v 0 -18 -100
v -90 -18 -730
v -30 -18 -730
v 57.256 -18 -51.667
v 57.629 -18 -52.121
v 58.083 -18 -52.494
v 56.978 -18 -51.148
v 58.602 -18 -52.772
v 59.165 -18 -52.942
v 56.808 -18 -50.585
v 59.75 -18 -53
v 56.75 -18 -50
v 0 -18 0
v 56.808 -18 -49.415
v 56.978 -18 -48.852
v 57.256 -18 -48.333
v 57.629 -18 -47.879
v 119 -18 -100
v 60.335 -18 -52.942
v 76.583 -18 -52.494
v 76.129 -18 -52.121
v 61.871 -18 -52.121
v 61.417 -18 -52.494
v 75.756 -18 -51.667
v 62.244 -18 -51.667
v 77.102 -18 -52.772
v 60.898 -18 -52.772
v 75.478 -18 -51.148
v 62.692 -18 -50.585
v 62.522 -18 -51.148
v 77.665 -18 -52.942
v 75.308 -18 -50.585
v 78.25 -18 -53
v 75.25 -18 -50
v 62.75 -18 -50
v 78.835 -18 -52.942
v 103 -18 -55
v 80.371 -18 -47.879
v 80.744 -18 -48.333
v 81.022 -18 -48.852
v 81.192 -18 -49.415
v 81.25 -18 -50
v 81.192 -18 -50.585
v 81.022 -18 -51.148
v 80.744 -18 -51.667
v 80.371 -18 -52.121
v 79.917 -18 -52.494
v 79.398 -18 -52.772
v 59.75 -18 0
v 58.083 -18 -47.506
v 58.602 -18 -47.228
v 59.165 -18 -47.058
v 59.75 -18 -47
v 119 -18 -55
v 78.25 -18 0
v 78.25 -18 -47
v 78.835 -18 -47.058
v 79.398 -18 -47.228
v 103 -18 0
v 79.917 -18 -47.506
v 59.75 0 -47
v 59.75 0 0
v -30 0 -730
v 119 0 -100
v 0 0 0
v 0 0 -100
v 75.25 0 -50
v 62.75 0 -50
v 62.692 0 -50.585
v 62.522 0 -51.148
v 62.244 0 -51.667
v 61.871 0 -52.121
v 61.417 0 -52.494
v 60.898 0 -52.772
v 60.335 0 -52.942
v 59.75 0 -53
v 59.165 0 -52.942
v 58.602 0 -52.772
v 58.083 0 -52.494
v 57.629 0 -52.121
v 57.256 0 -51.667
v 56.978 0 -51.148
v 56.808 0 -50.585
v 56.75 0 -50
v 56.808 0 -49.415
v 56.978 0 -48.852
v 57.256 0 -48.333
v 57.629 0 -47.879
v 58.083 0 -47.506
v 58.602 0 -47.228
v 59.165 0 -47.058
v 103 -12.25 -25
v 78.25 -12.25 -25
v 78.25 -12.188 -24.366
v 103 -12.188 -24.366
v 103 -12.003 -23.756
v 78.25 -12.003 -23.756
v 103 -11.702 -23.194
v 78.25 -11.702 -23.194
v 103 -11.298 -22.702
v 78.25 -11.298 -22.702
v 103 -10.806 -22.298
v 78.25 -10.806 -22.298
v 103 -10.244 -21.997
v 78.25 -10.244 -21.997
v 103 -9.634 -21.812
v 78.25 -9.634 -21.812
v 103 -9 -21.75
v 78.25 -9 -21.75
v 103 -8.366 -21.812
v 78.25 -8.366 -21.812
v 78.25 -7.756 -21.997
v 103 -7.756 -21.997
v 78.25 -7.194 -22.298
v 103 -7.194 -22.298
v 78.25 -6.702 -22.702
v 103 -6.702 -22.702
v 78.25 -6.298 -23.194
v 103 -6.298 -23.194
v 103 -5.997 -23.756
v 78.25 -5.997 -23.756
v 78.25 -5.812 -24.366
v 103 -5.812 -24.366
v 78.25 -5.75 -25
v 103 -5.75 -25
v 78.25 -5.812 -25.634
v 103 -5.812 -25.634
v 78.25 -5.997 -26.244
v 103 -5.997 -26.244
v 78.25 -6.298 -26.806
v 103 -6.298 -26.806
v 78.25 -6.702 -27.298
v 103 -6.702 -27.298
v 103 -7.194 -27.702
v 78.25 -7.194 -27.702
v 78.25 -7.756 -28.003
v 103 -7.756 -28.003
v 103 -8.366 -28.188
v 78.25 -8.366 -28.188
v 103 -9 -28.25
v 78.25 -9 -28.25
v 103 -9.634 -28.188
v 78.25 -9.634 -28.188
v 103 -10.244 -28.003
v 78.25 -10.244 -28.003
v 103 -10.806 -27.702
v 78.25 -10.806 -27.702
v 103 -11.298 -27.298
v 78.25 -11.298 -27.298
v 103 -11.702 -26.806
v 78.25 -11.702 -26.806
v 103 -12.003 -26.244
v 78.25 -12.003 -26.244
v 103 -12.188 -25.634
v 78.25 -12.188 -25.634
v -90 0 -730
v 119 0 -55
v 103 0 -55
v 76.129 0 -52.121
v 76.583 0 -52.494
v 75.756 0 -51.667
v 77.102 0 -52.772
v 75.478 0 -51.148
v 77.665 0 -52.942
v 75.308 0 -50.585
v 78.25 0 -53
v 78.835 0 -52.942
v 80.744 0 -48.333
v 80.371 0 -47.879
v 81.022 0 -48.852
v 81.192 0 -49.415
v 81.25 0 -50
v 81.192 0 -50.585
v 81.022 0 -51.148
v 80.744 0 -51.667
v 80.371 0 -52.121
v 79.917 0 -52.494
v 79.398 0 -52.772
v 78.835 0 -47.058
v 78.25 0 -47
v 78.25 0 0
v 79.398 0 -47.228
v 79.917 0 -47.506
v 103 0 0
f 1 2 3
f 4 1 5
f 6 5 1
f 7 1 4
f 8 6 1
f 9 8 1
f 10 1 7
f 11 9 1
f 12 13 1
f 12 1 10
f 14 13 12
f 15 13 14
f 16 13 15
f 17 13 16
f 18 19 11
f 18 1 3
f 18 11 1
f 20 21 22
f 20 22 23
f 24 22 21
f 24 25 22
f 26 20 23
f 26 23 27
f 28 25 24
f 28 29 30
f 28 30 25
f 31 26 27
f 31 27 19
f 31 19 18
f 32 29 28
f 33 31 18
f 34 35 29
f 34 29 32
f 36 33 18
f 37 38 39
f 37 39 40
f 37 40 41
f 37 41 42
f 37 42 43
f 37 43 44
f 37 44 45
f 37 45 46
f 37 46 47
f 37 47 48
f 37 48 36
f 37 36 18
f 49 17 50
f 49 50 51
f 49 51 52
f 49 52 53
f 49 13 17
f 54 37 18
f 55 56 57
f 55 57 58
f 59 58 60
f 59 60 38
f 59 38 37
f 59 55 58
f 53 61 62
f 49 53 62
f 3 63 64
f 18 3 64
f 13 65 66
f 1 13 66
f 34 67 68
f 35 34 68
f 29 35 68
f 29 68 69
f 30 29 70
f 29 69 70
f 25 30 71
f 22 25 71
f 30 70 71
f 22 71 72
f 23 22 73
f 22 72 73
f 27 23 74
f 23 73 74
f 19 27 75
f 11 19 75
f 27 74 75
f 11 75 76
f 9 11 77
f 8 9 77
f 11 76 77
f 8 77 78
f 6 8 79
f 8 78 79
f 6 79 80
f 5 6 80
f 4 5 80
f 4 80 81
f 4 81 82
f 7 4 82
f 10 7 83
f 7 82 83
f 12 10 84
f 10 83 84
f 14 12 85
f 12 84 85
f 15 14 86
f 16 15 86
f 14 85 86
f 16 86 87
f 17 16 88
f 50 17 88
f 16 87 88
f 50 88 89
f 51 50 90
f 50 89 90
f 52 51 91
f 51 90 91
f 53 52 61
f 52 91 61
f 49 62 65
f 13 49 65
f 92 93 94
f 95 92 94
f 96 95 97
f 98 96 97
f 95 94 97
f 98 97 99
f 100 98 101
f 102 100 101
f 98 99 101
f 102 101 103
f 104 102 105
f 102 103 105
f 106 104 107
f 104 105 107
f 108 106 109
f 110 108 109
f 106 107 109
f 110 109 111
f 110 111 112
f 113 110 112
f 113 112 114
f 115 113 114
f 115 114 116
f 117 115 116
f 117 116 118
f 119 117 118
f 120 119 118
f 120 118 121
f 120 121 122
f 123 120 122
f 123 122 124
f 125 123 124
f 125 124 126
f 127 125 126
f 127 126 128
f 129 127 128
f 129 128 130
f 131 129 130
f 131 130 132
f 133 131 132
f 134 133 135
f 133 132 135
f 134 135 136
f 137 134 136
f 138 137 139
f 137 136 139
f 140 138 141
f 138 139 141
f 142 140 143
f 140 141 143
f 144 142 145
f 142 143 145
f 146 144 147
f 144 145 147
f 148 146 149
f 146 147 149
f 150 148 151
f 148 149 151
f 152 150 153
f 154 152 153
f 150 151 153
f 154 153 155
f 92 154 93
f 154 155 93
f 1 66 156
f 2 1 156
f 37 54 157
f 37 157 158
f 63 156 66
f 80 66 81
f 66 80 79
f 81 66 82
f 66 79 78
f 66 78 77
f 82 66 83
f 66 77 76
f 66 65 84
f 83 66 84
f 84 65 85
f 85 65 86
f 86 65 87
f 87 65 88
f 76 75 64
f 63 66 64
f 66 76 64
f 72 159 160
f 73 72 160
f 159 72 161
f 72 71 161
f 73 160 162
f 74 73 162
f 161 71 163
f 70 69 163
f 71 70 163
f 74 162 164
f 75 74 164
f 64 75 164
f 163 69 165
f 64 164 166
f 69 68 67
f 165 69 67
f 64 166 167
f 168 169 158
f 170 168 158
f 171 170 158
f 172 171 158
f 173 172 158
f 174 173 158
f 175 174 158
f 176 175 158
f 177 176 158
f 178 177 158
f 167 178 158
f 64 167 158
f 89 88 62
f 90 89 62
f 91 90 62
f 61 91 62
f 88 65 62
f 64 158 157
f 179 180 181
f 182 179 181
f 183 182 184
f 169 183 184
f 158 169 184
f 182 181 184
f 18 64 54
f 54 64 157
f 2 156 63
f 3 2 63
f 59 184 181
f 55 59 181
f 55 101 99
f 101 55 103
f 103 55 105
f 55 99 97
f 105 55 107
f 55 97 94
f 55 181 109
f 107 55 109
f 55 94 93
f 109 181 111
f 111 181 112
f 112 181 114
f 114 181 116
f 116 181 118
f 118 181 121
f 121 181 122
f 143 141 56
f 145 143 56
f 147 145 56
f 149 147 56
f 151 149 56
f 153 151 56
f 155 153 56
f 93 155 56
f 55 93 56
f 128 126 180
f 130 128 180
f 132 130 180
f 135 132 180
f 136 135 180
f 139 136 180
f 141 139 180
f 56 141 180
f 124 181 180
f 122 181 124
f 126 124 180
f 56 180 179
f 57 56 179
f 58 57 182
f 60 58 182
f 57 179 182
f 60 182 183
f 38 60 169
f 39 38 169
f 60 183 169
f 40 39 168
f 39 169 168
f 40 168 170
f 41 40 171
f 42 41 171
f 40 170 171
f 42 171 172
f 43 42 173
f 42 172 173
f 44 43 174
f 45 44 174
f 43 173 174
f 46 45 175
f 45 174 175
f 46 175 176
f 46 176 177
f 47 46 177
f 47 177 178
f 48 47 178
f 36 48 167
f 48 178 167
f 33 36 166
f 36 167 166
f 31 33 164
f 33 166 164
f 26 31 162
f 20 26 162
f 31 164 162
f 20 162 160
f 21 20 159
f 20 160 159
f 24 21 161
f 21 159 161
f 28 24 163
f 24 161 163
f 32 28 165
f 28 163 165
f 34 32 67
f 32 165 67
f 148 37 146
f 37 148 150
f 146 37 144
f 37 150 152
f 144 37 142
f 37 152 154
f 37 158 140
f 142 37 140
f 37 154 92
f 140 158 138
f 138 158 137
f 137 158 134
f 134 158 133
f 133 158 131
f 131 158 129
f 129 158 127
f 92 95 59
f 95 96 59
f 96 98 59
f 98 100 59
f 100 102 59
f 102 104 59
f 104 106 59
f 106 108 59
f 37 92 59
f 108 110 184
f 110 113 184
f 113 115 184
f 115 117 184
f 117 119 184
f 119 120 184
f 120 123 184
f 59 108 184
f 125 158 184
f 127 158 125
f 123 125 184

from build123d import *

# Parameters (mm, degrees)
F1_DEPTH = 18
F3_D     = 6.5
F3_DEPTH = 25
F3_TIP   = 1.9527970118


# Not quite as in the source:
# - a feature names something its author has since deleted; it is built from what else it names


with BuildPart() as f1:
    # F0 (on Front) → F1 (new body)
    with BuildSketch(Plane.XZ):
        with BuildLine():
            Line((0, 0), (0, -100))
            Line((0, -100), (-90, -730))
            Line((-90, -730), (-30, -730))
            Line((-30, -730), (119, -100))
            Line((119, -100), (119, -55))
            Line((119, -55), (103, -55))
            Line((103, -55), (103, -25))
            Line((103, -25), (103, 0))
            Line((103, 0), (78.25, 0))
            Line((78.25, 0), (78.25, -47))
            ThreePointArc((78.25, -47), (80.3713203436, -52.1213203436), (75.25, -50))
            Line((75.25, -50), (62.75, -50))
            ThreePointArc((62.75, -50), (57.6286796564, -52.1213203436), (59.75, -47))
            Line((59.75, -47), (59.75, 0))
            Line((59.75, 0), (0, 0))
        make_face()
    extrude(amount=F1_DEPTH)

    # F3
    with Locations(Plane.YZ.offset(103)):
        with Locations((-9, -25)):
            Hole(F3_D / 2, depth=F3_DEPTH)
            with Locations((0, 0, -(F3_DEPTH + F3_TIP / 2))):  # 118° drill point
                Cone(0, F3_D / 2, F3_TIP, mode=Mode.SUBTRACT)


solid = f1.part
